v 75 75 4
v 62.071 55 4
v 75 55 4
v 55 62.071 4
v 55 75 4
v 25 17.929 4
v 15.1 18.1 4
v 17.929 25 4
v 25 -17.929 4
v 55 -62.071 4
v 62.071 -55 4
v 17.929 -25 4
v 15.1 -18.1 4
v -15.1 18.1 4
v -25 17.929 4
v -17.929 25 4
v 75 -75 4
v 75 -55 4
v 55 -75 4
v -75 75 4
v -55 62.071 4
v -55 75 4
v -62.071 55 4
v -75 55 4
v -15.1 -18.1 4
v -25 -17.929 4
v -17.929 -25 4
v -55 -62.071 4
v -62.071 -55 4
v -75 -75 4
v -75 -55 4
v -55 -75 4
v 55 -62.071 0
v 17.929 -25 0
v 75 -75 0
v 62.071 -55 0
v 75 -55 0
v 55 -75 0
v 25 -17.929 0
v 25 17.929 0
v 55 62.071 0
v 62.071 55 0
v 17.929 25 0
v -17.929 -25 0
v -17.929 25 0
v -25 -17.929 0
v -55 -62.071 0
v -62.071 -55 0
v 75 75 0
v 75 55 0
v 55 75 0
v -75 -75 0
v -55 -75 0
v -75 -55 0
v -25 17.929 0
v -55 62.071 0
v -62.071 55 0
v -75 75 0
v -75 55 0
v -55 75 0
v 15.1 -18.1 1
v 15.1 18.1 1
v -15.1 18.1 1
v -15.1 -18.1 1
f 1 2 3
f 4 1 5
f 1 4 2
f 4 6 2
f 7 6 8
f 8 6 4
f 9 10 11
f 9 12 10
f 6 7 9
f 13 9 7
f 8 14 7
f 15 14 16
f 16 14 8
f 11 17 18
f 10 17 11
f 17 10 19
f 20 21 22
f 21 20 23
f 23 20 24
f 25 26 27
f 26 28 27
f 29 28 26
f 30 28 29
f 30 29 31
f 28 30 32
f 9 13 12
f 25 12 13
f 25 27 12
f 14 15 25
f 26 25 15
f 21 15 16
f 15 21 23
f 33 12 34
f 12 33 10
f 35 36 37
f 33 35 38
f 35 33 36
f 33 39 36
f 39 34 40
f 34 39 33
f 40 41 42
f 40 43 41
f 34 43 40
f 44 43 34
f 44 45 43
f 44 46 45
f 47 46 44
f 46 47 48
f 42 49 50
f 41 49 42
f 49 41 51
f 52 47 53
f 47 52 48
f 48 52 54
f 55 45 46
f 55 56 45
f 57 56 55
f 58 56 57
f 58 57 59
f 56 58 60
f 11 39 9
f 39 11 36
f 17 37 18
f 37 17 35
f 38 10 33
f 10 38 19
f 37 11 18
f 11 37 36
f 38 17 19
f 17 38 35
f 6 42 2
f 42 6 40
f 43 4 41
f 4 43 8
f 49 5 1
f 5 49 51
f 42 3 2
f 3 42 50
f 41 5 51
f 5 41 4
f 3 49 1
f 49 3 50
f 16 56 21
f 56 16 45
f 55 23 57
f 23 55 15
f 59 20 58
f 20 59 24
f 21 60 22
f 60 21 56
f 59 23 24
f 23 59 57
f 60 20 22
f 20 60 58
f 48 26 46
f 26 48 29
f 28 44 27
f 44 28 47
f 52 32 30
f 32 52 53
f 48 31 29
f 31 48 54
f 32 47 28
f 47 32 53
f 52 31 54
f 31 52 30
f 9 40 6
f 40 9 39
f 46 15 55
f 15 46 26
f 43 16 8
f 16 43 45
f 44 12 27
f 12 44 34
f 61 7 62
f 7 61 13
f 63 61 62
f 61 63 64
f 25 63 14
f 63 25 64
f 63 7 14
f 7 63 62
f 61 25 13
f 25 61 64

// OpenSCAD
// file: drzakMotoru.scad
// sof
// ------------------------------------------------------------------
//
// Autor: Ivo Panáček, December 2021
// ivo.panacek@gmail.com
// Version: 0
//
// ------------------------------------------------------------------
//
// drzak na motor MG996R
//
// ------------------------------------------------------------------

// dreh=$t*360;
$fn=1000;

// ------------------------------------------------------------------
// main program


drzakMotoru();

// ------------------------------------------------------------------
// moduly

module drzakMotoru(thickness=4) {
    delta = 48; // 41 + 2x polovina width

    translate([0,0,10])
    rotate([0,90,0])
    union() {
        translate([0,-delta/2,0])noha(thickness);
        translate([0,delta/2,0])noha(thickness);
    }
}

module noha(thickness=4) {
    height = 20;
    width = 7;

    difference() {
        translate([-height/2,-width/2,0])
        cube([height,width,thickness]);
        otvory(thickness);
    }
}

module otvory(thickness=4) {
    delta = 10;

    union() {
        translate([-delta/2,0,0])otvor(thickness);
        translate([delta/2,0,0])otvor(thickness);
    }    
}

module otvor(thickness=4) {
    diameter = 4;
    
    translate([0,0,-0.5])
    cylinder(d=diameter,h=thickness+1);
}

// ------------------------------------------------------------------
// eof
// main file
// sof
// ------------------------------------------------------------------
//
// Autor: Ivo Panáček, December 2021
// ivo.panacek@gmail.com
// Version: 0
//
// ------------------------------------------------------------------
//
// díl č. 0 - základna
//
// ------------------------------------------------------------------

use <drzakMotoru.scad>;

sqrt2 = sqrt(2);

// ------------------------------------------------------------------
// main program

//leg(4,30,50,10,20);
//legs(4,50,140);
//block(4,140);

part0();

// ------------------------------------------------------------------
// moduly

module part0(thickness=4) {
    width = 140;

    difference() {
        block(thickness=thickness,width = 140);
        translate([0,0,1])
        hole(thickness);
    }
}

module hole(thickness=4) {
    gap = 0.2;
    width = 36 + gap;
    height = 30 + gap;

    translate([-height/2,-width/2,0])
    cube([height,width,thickness]);
}

module fullBlock(thickness=4,width = 140) {

    translate([-width/2,-width/2,0])
    cube([width,width,thickness]);
}

module block(thickness=4,width = 140) {
    innerWidth = 50;

    union() {
        translate([-innerWidth/2,-innerWidth/2,0])
        cube([innerWidth,innerWidth,thickness]);
        legs(thickness,innerWidth,width);
    }
}

module legs(thickness,innerWidth, width) {
    legSize = (width-innerWidth)/2;
    legHeight = legSize * sqrt2;
    pawWidth = 10;
    shift = (innerWidth-pawWidth)/2;
    hoof = 20;

    union() {
        leg(thickness,shift,legHeight,pawWidth,hoof);
        rotate([0,0,90]) leg(thickness,shift,legHeight,pawWidth,hoof);
        rotate([0,0,180]) leg(thickness,shift,legHeight,pawWidth,hoof);
        rotate([0,0,270]) leg(thickness,shift,legHeight,pawWidth,hoof);
    }
}


module leg(thickness,shift,height,pawWidth,width) {
    move = height/sqrt2;
    translate([move+shift,-move-shift,0])
    union() {
        rotate([0,0,45])
        translate([-pawWidth/2,0,0])
        cube([pawWidth,height,thickness]);
        color([0,1,0])
        translate([-width/2,-width/2,0])
        cube([width,width,thickness]);
    }
}

// ------------------------------------------------------------------
// eof
